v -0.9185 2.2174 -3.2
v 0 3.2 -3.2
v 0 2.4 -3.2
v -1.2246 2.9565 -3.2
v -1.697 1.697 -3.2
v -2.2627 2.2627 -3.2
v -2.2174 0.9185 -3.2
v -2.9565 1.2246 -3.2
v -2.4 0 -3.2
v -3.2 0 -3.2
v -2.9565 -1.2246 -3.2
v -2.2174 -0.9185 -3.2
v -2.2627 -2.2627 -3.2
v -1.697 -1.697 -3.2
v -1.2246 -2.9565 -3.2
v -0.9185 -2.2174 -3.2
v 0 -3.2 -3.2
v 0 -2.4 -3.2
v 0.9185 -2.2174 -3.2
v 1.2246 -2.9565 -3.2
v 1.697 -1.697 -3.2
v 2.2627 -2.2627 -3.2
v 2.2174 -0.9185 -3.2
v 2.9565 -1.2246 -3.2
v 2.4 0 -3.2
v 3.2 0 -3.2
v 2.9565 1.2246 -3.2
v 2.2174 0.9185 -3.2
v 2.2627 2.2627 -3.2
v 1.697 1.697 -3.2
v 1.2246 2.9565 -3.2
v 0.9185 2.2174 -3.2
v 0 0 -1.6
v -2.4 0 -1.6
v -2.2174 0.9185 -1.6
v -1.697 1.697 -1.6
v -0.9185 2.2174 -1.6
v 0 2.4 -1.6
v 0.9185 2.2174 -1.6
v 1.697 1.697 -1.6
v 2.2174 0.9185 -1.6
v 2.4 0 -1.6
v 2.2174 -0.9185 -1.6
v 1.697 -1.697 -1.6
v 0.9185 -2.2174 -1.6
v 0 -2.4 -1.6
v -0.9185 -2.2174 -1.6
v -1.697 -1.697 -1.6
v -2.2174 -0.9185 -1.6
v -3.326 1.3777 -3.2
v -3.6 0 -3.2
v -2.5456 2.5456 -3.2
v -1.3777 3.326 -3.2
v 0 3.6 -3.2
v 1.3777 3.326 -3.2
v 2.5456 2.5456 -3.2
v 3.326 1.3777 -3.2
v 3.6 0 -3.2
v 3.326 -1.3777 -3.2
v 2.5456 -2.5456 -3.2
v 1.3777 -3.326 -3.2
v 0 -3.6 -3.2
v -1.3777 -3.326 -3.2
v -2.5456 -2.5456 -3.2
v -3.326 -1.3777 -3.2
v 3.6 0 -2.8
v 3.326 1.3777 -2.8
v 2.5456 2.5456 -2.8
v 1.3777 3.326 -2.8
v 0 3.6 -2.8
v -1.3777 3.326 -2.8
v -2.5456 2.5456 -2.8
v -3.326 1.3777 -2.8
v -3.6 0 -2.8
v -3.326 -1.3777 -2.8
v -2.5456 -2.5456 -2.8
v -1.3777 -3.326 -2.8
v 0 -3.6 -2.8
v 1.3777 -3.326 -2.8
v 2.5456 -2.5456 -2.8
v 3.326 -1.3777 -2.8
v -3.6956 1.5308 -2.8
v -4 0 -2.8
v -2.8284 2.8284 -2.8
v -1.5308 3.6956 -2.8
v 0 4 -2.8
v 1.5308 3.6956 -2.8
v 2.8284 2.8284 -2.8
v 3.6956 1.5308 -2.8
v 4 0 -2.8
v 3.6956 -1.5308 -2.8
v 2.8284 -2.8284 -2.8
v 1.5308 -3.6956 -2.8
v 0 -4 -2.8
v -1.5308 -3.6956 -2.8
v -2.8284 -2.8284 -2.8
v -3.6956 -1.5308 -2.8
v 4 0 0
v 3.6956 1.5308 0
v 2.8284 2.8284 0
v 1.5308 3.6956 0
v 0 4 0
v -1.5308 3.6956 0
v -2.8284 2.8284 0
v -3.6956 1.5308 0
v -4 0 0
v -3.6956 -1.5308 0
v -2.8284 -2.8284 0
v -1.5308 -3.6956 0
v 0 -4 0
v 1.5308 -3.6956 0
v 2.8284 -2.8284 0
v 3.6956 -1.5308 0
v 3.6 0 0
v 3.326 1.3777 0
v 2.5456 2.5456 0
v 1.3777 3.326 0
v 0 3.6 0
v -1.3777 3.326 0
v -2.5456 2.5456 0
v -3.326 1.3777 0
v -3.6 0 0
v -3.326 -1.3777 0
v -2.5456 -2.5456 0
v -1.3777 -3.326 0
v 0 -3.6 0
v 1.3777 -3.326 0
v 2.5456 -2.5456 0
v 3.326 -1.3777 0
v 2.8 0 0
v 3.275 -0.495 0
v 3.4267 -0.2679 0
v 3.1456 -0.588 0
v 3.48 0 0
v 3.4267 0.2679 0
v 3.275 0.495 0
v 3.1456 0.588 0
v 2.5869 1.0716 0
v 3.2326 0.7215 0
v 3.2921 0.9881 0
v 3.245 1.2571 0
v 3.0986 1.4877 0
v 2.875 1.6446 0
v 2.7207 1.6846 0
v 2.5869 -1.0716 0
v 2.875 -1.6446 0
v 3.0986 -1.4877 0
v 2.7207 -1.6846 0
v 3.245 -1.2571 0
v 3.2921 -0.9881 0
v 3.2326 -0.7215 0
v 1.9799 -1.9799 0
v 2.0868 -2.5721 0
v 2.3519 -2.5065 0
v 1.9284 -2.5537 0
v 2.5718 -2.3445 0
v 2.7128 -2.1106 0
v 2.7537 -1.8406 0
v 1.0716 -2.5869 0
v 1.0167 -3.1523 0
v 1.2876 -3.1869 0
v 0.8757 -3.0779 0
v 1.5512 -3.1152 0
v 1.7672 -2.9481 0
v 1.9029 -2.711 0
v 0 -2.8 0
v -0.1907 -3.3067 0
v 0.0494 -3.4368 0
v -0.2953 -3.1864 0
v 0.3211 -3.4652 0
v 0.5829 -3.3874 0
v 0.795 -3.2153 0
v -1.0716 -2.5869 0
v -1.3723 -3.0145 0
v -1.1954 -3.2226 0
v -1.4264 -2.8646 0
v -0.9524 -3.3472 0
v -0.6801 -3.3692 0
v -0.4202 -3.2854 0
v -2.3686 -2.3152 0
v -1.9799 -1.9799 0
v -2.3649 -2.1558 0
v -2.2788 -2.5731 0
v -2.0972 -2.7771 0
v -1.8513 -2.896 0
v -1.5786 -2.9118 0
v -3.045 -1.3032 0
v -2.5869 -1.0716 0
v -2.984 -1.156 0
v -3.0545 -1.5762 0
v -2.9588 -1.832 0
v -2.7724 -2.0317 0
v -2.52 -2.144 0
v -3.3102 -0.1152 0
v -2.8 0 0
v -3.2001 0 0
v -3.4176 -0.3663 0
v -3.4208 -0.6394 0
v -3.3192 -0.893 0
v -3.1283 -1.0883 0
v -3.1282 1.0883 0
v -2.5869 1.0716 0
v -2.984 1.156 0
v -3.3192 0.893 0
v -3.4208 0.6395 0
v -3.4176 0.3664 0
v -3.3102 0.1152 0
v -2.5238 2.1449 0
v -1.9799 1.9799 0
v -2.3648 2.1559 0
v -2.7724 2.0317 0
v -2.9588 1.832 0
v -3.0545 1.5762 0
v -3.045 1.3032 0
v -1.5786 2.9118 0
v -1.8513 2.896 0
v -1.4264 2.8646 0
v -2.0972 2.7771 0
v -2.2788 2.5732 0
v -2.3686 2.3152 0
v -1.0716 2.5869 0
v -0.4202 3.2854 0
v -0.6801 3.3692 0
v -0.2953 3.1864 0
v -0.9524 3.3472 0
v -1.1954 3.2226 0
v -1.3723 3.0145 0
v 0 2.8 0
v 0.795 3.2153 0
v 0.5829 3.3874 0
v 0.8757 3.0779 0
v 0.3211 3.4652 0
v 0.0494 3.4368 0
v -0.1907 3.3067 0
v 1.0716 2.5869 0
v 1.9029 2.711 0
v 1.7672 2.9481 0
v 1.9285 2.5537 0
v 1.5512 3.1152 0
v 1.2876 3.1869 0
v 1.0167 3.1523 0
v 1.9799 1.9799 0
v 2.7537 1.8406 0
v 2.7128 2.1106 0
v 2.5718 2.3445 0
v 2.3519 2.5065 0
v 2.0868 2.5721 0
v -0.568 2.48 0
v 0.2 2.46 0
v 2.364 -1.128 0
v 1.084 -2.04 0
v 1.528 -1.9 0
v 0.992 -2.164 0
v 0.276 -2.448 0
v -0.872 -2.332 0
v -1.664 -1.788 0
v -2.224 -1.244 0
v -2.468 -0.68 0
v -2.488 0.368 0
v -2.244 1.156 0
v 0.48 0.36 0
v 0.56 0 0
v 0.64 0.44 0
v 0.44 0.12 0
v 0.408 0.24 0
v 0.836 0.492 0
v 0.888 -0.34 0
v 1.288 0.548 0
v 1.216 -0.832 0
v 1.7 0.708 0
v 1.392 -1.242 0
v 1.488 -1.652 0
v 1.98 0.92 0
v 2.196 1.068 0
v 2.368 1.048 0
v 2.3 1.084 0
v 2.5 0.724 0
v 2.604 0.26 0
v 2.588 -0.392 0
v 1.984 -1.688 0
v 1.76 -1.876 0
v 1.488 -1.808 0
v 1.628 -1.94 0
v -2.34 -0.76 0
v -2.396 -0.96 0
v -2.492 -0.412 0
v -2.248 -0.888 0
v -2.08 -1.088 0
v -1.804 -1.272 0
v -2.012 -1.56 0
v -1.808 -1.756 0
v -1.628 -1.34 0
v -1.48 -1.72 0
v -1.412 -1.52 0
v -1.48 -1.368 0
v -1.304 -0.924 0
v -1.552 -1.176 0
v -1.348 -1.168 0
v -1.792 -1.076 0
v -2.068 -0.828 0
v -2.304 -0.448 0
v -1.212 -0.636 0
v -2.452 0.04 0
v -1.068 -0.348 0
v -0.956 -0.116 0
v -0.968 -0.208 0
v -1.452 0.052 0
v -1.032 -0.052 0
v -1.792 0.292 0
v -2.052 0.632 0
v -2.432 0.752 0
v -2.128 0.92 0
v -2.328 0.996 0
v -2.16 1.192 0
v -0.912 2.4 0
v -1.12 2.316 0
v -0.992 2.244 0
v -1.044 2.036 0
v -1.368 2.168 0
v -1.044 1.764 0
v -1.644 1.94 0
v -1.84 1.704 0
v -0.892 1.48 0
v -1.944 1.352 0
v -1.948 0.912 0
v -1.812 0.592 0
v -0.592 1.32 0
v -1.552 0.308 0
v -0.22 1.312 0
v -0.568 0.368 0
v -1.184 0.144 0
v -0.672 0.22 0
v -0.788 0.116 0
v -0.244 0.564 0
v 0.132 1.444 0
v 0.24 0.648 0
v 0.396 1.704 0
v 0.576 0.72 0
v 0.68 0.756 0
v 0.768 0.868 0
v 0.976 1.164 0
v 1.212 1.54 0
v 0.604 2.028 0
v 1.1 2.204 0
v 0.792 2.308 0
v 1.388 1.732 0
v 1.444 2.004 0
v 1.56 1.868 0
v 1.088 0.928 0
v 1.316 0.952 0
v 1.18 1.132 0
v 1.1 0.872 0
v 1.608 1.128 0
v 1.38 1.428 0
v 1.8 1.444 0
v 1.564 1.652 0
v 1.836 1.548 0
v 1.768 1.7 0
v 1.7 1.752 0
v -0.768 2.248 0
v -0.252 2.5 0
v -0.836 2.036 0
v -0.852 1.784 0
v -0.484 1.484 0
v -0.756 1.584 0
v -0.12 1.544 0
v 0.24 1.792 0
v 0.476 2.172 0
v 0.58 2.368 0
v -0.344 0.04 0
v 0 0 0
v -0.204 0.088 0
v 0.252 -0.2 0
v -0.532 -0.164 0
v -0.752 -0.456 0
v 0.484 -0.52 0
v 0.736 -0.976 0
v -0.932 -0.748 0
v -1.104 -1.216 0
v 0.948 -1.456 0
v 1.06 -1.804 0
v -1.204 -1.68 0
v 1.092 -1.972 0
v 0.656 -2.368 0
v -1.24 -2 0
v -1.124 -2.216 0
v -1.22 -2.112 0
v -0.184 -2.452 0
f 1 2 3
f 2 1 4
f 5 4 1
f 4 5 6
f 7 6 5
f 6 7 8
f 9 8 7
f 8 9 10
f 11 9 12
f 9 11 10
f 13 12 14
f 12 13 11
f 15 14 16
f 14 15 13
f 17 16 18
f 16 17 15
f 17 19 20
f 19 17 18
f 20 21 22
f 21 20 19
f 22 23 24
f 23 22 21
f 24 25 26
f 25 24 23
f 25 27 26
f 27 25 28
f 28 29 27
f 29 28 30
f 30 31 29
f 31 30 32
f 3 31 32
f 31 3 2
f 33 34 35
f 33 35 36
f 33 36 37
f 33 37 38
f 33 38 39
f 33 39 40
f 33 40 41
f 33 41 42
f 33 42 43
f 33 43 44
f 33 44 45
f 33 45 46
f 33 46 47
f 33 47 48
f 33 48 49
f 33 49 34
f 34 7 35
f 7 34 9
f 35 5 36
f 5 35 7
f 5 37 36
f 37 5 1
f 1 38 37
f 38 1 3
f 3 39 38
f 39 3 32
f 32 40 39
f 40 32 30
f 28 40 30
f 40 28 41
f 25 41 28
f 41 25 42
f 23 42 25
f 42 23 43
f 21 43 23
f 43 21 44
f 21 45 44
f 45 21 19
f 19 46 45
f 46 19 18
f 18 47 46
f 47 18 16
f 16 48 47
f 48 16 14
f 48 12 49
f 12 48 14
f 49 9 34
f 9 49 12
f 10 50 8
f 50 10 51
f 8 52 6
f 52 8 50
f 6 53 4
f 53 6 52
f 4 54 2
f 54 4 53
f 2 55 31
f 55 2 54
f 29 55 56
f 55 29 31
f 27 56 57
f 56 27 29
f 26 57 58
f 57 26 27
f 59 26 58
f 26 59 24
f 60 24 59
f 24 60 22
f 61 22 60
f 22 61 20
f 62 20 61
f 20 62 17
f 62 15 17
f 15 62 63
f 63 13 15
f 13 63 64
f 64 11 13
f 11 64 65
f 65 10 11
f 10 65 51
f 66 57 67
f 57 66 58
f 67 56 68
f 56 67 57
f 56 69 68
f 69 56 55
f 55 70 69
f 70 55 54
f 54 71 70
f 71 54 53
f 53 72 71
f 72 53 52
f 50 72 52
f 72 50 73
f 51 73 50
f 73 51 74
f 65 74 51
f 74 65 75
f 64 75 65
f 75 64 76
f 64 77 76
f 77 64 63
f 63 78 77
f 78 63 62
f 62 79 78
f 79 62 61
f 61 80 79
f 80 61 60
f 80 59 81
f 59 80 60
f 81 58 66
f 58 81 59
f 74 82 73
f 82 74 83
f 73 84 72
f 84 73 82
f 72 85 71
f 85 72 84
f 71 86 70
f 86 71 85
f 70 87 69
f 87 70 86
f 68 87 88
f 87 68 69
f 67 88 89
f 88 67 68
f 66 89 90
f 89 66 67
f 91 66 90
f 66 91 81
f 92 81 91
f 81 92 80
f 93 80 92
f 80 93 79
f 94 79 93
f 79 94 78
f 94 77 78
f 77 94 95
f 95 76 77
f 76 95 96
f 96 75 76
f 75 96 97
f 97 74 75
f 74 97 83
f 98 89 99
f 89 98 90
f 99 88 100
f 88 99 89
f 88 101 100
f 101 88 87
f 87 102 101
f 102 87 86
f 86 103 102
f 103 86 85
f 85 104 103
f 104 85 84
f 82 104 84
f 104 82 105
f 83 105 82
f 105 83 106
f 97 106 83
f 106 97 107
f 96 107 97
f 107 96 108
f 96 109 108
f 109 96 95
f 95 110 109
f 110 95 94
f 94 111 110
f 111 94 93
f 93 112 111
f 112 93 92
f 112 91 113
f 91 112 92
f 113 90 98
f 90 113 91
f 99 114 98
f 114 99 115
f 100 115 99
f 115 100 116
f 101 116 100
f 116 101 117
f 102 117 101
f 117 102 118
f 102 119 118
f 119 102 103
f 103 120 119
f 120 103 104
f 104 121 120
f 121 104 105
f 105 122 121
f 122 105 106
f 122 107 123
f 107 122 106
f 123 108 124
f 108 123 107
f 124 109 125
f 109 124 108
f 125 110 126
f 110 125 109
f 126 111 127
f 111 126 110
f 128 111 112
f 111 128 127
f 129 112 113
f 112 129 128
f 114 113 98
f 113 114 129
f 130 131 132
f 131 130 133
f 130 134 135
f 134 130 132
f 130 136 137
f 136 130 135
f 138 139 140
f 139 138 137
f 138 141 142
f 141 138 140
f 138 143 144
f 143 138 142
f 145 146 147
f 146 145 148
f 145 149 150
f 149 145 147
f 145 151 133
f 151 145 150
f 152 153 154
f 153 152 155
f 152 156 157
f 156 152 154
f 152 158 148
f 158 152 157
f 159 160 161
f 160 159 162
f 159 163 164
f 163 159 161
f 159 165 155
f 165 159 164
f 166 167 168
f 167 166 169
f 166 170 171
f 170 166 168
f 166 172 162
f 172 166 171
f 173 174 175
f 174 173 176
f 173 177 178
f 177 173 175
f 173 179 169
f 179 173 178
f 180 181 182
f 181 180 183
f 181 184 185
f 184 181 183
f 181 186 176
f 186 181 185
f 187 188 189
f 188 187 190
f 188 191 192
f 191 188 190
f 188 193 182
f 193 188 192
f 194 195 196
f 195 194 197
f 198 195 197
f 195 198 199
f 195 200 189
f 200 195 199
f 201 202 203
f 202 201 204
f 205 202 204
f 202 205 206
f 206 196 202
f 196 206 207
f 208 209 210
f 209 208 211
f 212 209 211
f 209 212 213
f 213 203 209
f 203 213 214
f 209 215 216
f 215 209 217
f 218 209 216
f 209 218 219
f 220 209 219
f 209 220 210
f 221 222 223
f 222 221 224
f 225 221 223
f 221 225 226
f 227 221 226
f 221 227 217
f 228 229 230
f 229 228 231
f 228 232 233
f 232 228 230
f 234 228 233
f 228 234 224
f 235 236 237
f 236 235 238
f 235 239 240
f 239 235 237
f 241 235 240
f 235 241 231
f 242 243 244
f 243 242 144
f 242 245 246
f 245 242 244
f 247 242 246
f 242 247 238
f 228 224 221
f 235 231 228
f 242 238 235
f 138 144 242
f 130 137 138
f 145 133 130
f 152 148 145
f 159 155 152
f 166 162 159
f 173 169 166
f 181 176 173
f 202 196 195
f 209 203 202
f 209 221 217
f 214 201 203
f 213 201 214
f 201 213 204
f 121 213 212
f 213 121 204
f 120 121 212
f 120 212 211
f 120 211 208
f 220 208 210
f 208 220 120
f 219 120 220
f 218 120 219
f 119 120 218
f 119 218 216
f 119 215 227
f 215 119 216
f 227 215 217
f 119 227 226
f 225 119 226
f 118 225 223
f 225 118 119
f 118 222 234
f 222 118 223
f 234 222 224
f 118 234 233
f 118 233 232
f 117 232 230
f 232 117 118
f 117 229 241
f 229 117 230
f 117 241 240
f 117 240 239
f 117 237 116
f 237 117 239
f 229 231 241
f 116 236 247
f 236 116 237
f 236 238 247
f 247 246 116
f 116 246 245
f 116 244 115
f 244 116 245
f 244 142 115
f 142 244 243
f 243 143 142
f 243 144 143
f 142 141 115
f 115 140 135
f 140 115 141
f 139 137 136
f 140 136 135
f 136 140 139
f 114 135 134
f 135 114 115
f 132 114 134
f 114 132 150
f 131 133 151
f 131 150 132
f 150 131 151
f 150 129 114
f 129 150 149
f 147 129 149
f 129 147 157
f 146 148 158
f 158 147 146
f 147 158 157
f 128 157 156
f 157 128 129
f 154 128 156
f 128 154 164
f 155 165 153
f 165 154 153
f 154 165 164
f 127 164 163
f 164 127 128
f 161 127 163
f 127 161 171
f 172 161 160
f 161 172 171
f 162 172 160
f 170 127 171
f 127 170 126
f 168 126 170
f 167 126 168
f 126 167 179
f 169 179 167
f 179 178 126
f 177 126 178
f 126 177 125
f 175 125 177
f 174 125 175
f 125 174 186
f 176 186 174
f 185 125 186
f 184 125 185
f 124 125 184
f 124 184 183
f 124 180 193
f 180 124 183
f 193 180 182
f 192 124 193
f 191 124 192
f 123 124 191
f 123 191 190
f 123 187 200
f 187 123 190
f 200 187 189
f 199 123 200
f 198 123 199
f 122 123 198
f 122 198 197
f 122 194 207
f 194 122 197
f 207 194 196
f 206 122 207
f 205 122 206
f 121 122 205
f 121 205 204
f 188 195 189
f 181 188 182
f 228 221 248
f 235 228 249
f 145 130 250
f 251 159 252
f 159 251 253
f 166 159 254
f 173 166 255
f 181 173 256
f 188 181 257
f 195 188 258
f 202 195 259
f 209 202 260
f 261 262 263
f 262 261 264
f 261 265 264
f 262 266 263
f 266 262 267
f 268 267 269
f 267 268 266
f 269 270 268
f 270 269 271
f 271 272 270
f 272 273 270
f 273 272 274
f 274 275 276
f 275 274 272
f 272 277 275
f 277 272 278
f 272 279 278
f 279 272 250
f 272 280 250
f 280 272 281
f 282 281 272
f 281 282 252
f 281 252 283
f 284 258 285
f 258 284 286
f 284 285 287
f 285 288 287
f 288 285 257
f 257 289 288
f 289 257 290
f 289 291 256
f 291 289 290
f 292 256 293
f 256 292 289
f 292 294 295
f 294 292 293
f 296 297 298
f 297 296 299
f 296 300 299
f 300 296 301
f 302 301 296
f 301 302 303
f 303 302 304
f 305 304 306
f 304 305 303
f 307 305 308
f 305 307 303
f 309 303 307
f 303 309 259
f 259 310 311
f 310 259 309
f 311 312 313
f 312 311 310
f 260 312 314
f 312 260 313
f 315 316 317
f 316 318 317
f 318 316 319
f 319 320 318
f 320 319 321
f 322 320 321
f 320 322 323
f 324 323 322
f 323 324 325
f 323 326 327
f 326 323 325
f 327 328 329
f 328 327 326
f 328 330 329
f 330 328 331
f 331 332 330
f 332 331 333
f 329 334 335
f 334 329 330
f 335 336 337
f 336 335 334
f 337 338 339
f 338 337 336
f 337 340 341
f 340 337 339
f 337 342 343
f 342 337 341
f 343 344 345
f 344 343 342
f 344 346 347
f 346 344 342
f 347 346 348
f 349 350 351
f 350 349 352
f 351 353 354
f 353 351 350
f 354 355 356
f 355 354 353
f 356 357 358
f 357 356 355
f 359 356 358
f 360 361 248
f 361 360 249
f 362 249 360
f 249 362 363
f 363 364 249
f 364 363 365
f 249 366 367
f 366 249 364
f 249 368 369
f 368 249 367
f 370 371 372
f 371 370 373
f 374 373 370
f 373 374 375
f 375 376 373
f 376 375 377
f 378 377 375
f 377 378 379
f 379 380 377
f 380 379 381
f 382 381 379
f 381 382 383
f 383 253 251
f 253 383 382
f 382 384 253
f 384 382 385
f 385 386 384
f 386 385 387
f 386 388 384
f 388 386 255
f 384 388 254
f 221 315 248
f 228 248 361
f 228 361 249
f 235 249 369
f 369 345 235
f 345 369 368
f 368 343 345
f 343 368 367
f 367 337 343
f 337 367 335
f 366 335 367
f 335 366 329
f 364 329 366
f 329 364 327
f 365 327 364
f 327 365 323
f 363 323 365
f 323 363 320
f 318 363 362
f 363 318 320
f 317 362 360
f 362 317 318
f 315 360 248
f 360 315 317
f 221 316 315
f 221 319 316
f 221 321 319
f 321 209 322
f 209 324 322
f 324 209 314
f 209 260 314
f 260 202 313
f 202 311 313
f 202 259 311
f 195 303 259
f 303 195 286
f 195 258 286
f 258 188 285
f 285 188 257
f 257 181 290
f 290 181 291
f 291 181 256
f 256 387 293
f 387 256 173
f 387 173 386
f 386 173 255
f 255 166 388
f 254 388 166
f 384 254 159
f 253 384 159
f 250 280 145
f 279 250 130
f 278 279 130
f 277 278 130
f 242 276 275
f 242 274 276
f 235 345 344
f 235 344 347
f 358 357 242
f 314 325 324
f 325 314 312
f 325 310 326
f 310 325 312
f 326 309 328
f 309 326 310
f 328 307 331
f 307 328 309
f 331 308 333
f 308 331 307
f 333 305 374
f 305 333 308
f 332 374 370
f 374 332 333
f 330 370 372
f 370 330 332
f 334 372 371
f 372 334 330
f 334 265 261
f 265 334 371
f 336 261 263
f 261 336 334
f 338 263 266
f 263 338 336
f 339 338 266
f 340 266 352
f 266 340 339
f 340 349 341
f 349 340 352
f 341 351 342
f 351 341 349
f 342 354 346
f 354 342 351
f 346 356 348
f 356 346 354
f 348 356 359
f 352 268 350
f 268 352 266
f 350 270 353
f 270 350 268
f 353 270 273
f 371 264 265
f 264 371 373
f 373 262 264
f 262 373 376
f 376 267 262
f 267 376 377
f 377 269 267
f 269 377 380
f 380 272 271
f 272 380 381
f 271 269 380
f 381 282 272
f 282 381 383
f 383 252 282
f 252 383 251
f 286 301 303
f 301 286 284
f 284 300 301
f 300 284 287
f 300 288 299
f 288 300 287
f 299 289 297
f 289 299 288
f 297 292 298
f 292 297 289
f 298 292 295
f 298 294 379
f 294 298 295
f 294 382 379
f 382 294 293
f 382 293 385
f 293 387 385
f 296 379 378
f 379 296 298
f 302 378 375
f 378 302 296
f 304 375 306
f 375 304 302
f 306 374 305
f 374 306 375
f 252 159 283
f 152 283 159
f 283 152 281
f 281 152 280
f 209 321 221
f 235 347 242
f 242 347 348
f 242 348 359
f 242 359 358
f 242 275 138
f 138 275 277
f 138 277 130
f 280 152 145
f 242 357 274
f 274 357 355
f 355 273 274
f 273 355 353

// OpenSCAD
use <../lib.scad>
use <../p/4-4ering.scad>
use <s/98138pn2s01.scad>
use <s/98138s01.scad>
function ldraw_lib__98138pn2() = [
// 0 Tile  1 x  1 Round with Sushi Salmon Maki Roll Pattern
// 0 Name: 98138pn2.dat
// 0 Author: Gerald Lasser [GeraldLasser]
// 0 !LDRAW_ORG Part UPDATE 2018-01
// 0 !LICENSE Licensed under CC BY 2.0 and CC BY 4.0 : see CAreadme.txt
// 
// 0 BFC CERTIFY CCW
  [0,"BFC","CERTIFY"],
  [0,"BFC","CCW"],
// 
// 0 !KEYWORDS BrickLink 98138pb038
// 
// 0 !HISTORY 2018-01-30 [PTadmin] Official Update 2018-01
// 
// 
// 1 16 0 0 0 1 0 0 0 1 0 0 0 1 s\98138s01.dat
  [1,16,0,0,0,1,0,0,0,1,0,0,0,1, ldraw_lib__s__98138s01()],
// 1 16 0 0 0 1 0 0 0 1 0 0 0 1 s\98138pn2s01.dat
  [1,16,0,0,0,1,0,0,0,1,0,0,0,1, ldraw_lib__s__98138pn2s01()],
// 1 16 0 0 0 9 0 0 0 1 0 0 0 9 4-4ering.dat
  [1,16,0,0,0,9,0,0,0,1,0,0,0,9, ldraw_lib__4_4ering()],
// 3 15 0 0 7 -2.6789 0 6.4673 -1.42 0 6.2
  [3,15,0,0,7,-2.6789,0,6.4673,-1.42,0,6.2],
// 3 15 2.6789 0 6.4673 0 0 7 .5 0 6.15
  [3,15,2.6789,0,6.4673,0,0,7,.5,0,6.15],
// 3 15 6.4673 0 -2.6789 7 0 0 5.91 0 -2.82
  [3,15,6.4673,0,-2.6789,7,0,0,5.91,0,-2.82],
// 4 15 2.6789 0 -6.4673 3.82 0 -4.75 2.71 0 -5.1 2.48 0 -5.41
  [4,15,2.6789,0,-6.4673,3.82,0,-4.75,2.71,0,-5.1,2.48,0,-5.41],
// 3 15 0 0 -7 2.6789 0 -6.4673 .69 0 -6.12
  [3,15,0,0,-7,2.6789,0,-6.4673,.69,0,-6.12],
// 3 15 -2.6789 0 -6.4673 0 0 -7 -2.18 0 -5.83
  [3,15,-2.6789,0,-6.4673,0,0,-7,-2.18,0,-5.83],
// 3 15 -4.9497 0 -4.9497 -2.6789 0 -6.4673 -4.16 0 -4.47
  [3,15,-4.9497,0,-4.9497,-2.6789,0,-6.4673,-4.16,0,-4.47],
// 3 15 -6.4673 0 -2.6789 -4.9497 0 -4.9497 -5.56 0 -3.11
  [3,15,-6.4673,0,-2.6789,-4.9497,0,-4.9497,-5.56,0,-3.11],
// 3 15 -7 0 0 -6.4673 0 -2.6789 -6.17 0 -1.7
  [3,15,-7,0,0,-6.4673,0,-2.6789,-6.17,0,-1.7],
// 3 15 -6.4673 0 2.6789 -7 0 0 -6.22 0 .92
  [3,15,-6.4673,0,2.6789,-7,0,0,-6.22,0,.92],
// 3 15 -4.9497 0 4.9497 -6.4673 0 2.6789 -5.61 0 2.89
  [3,15,-4.9497,0,4.9497,-6.4673,0,2.6789,-5.61,0,2.89],
// 4 27 1.4 0 0 1.6 0 1.1 1.2 0 .9 1.1 0 .3
  [4,27,1.4,0,0,1.6,0,1.1,1.2,0,.9,1.1,0,.3],
// 3 27 1.2 0 .9 1.02 0 .6 1.1 0 .3
  [3,27,1.2,0,.9,1.02,0,.6,1.1,0,.3],
// 4 27 1.6 0 1.1 1.4 0 0 2.22 0 -.85 2.09 0 1.23
  [4,27,1.6,0,1.1,1.4,0,0,2.22,0,-.85,2.09,0,1.23],
// 4 27 3.22 0 1.37 2.09 0 1.23 2.22 0 -.85 3.04 0 -2.08
  [4,27,3.22,0,1.37,2.09,0,1.23,2.22,0,-.85,3.04,0,-2.08],
// 4 27 3.04 0 -2.08 3.48 0 -3.105 4.25 0 1.77 3.22 0 1.37
  [4,27,3.04,0,-2.08,3.48,0,-3.105,4.25,0,1.77,3.22,0,1.37],
// 3 27 3.48 0 -3.105 3.72 0 -4.13 4.25 0 1.77
  [3,27,3.48,0,-3.105,3.72,0,-4.13,4.25,0,1.77],
// 4 27 4.95 0 2.3 4.25 0 1.77 3.72 0 -4.13 5.49 0 2.67
  [4,27,4.95,0,2.3,4.25,0,1.77,3.72,0,-4.13,5.49,0,2.67],
// 4 27 5.75 0 2.71 5.49 0 2.67 3.72 0 -4.13 5.92 0 2.62
  [4,27,5.75,0,2.71,5.49,0,2.67,3.72,0,-4.13,5.92,0,2.62],
// 4 27 6.25 0 1.81 5.92 0 2.62 3.72 0 -4.13 6.51 0 .65
  [4,27,6.25,0,1.81,5.92,0,2.62,3.72,0,-4.13,6.51,0,.65],
// 4 27 6.47 0 -.98 6.51 0 .65 3.72 0 -4.13 5.91 0 -2.82
  [4,27,6.47,0,-.98,6.51,0,.65,3.72,0,-4.13,5.91,0,-2.82],
// 4 27 4.96 0 -4.22 5.91 0 -2.82 3.72 0 -4.13 4.4 0 -4.69
  [4,27,4.96,0,-4.22,5.91,0,-2.82,3.72,0,-4.13,4.4,0,-4.69],
// 4 27 4.4 0 -4.69 3.72 0 -4.13 3.72 0 -4.52 3.82 0 -4.75
  [4,27,4.4,0,-4.69,3.72,0,-4.13,3.72,0,-4.52,3.82,0,-4.75],
// 3 27 4.4 0 -4.69 3.82 0 -4.75 4.07 0 -4.85
  [3,27,4.4,0,-4.69,3.82,0,-4.75,4.07,0,-4.85],
// 4 25 -5.85 0 -1.9 -6.23 0 -1.03 -6.17 0 -1.7 -5.99 0 -2.4
  [4,25,-5.85,0,-1.9,-6.23,0,-1.03,-6.17,0,-1.7,-5.99,0,-2.4],
// 3 25 -5.85 0 -1.9 -5.99 0 -2.4 -5.62 0 -2.22
  [3,25,-5.85,0,-1.9,-5.99,0,-2.4,-5.62,0,-2.22],
// 4 25 -5.2 0 -2.72 -5.62 0 -2.22 -5.99 0 -2.4 -5.56 0 -3.11
  [4,25,-5.2,0,-2.72,-5.62,0,-2.22,-5.99,0,-2.4,-5.56,0,-3.11],
// 4 25 -4.51 0 -3.18 -5.2 0 -2.72 -5.56 0 -3.11 -5.03 0 -3.9
  [4,25,-4.51,0,-3.18,-5.2,0,-2.72,-5.56,0,-3.11,-5.03,0,-3.9],
// 4 25 -4.51 0 -3.18 -5.03 0 -3.9 -4.52 0 -4.39 -4.16 0 -4.47
  [4,25,-4.51,0,-3.18,-5.03,0,-3.9,-4.52,0,-4.39,-4.16,0,-4.47],
// 4 25 -4.07 0 -3.35 -4.51 0 -3.18 -4.16 0 -4.47 -3.7 0 -4.3
  [4,25,-4.07,0,-3.35,-4.51,0,-3.18,-4.16,0,-4.47,-3.7,0,-4.3],
// 4 25 -3.7 0 -3.42 -4.07 0 -3.35 -3.7 0 -4.3 -3.53 0 -3.8
  [4,25,-3.7,0,-3.42,-4.07,0,-3.35,-3.7,0,-4.3,-3.53,0,-3.8],
// 4 25 -3.88 0 -2.94 -3.37 0 -2.92 -3.26 0 -2.31 -4.48 0 -2.69
  [4,25,-3.88,0,-2.94,-3.37,0,-2.92,-3.26,0,-2.31,-4.48,0,-2.69],
// 4 25 -5.17 0 -2.07 -4.48 0 -2.69 -3.26 0 -2.31 -5.76 0 -1.12
  [4,25,-5.17,0,-2.07,-4.48,0,-2.69,-3.26,0,-2.31,-5.76,0,-1.12],
// 4 25 -5.76 0 -1.12 -3.26 0 -2.31 -3.03 0 -1.59 -6.13 0 .1
  [4,25,-5.76,0,-1.12,-3.26,0,-2.31,-3.03,0,-1.59,-6.13,0,.1],
// 3 25 -6.13 0 .1 -3.03 0 -1.59 -2.67 0 -.87
  [3,25,-6.13,0,.1,-3.03,0,-1.59,-2.67,0,-.87],
// 4 25 -6.13 0 .1 -2.67 0 -.87 -2.42 0 -.52 -2.39 0 -.29
  [4,25,-6.13,0,.1,-2.67,0,-.87,-2.42,0,-.52,-2.39,0,-.29],
// 4 25 -6.13 0 .1 -2.39 0 -.29 -2.58 0 -.13 -3.63 0 .13
  [4,25,-6.13,0,.1,-2.39,0,-.29,-2.58,0,-.13,-3.63,0,.13],
// 4 25 -6.22 0 .92 -6.13 0 .1 -3.63 0 .13 -4.48 0 .73
  [4,25,-6.22,0,.92,-6.13,0,.1,-3.63,0,.13,-4.48,0,.73],
// 4 25 -6.22 0 .92 -4.48 0 .73 -5.13 0 1.58 -6.08 0 1.88
  [4,25,-6.22,0,.92,-4.48,0,.73,-5.13,0,1.58,-6.08,0,1.88],
// 4 25 -6.08 0 1.88 -5.13 0 1.58 -5.32 0 2.3 -5.82 0 2.49
  [4,25,-6.08,0,1.88,-5.13,0,1.58,-5.32,0,2.3,-5.82,0,2.49],
// 4 25 -5.61 0 2.89 -5.82 0 2.49 -5.32 0 2.3 -5.4 0 2.98
  [4,25,-5.61,0,2.89,-5.82,0,2.49,-5.32,0,2.3,-5.4,0,2.98],
// 3 25 -2.28 0 6 -2.8 0 5.79 -2.48 0 5.61
  [3,25,-2.28,0,6,-2.8,0,5.79,-2.48,0,5.61],
// 4 25 -2.61 0 5.09 -2.48 0 5.61 -2.8 0 5.79 -3.42 0 5.42
  [4,25,-2.61,0,5.09,-2.48,0,5.61,-2.8,0,5.79,-3.42,0,5.42],
// 4 25 -2.61 0 5.09 -3.42 0 5.42 -4.11 0 4.85 -2.61 0 4.41
  [4,25,-2.61,0,5.09,-3.42,0,5.42,-4.11,0,4.85,-2.61,0,4.41],
// 4 25 -2.61 0 4.41 -4.11 0 4.85 -4.6 0 4.26 -2.23 0 3.7
  [4,25,-2.61,0,4.41,-4.11,0,4.85,-4.6,0,4.26,-2.23,0,3.7],
// 4 25 -2.23 0 3.7 -4.6 0 4.26 -4.86 0 3.38 -4.87 0 2.28
  [4,25,-2.23,0,3.7,-4.6,0,4.26,-4.86,0,3.38,-4.87,0,2.28],
// 4 25 -1.48 0 3.3 -2.23 0 3.7 -4.87 0 2.28 -4.53 0 1.48
  [4,25,-1.48,0,3.3,-2.23,0,3.7,-4.87,0,2.28,-4.53,0,1.48],
// 4 25 -.55 0 3.28 -1.48 0 3.3 -4.53 0 1.48 -3.88 0 .77
  [4,25,-.55,0,3.28,-1.48,0,3.3,-4.53,0,1.48,-3.88,0,.77],
// 4 25 -.55 0 3.28 -3.88 0 .77 -2.96 0 .36 -1.42 0 .92
  [4,25,-.55,0,3.28,-3.88,0,.77,-2.96,0,.36,-1.42,0,.92],
// 4 25 -1.68 0 .55 -1.42 0 .92 -2.96 0 .36 -1.97 0 .29
  [4,25,-1.68,0,.55,-1.42,0,.92,-2.96,0,.36,-1.97,0,.29],
// 4 25 -.55 0 3.28 -1.42 0 .92 -.61 0 1.41 .33 0 3.61
  [4,25,-.55,0,3.28,-1.42,0,.92,-.61,0,1.41,.33,0,3.61],
// 4 25 .33 0 3.61 -.61 0 1.41 .6 0 1.62 .99 0 4.26
  [4,25,.33,0,3.61,-.61,0,1.41,.6,0,1.62,.99,0,4.26],
// 4 25 .99 0 4.26 .6 0 1.62 1.44 0 1.8 1.7 0 1.89
  [4,25,.99,0,4.26,.6,0,1.62,1.44,0,1.8,1.7,0,1.89],
// 4 25 .99 0 4.26 1.7 0 1.89 1.92 0 2.17 2.44 0 2.91
  [4,25,.99,0,4.26,1.7,0,1.89,1.92,0,2.17,2.44,0,2.91],
// 4 25 1.51 0 5.07 .99 0 4.26 2.44 0 2.91 3.03 0 3.85
  [4,25,1.51,0,5.07,.99,0,4.26,2.44,0,2.91,3.03,0,3.85],
// 4 25 1.98 0 5.77 1.51 0 5.07 3.03 0 3.85 2.75 0 5.51
  [4,25,1.98,0,5.77,1.51,0,5.07,3.03,0,3.85,2.75,0,5.51],
// 4 25 2.75 0 5.51 3.03 0 3.85 3.47 0 4.33 3.61 0 5.01
  [4,25,2.75,0,5.51,3.03,0,3.85,3.47,0,4.33,3.61,0,5.01],
// 3 25 3.61 0 5.01 3.47 0 4.33 3.9 0 4.67
  [3,25,3.61,0,5.01,3.47,0,4.33,3.9,0,4.67],
// 4 25 2.95 0 2.83 2.72 0 2.32 2.75 0 2.18 3.29 0 2.38
  [4,25,2.95,0,2.83,2.72,0,2.32,2.75,0,2.18,3.29,0,2.38],
// 4 25 2.95 0 2.83 3.29 0 2.38 4.02 0 2.82 3.45 0 3.57
  [4,25,2.95,0,2.83,3.29,0,2.38,4.02,0,2.82,3.45,0,3.57],
// 4 25 3.91 0 4.13 3.45 0 3.57 4.02 0 2.82 4.5 0 3.61
  [4,25,3.91,0,4.13,3.45,0,3.57,4.02,0,2.82,4.5,0,3.61],
// 4 25 3.91 0 4.13 4.5 0 3.61 4.59 0 3.87 4.42 0 4.25
  [4,25,3.91,0,4.13,4.5,0,3.61,4.59,0,3.87,4.42,0,4.25],
// 3 25 4.25 0 4.38 3.91 0 4.13 4.42 0 4.25
  [3,25,4.25,0,4.38,3.91,0,4.13,4.42,0,4.25],
// 4 25 -.63 0 6.25 -1.42 0 6.2 -1.92 0 5.62 .5 0 6.15
  [4,25,-.63,0,6.25,-1.42,0,6.2,-1.92,0,5.62,.5,0,6.15],
// 4 25 .5 0 6.15 -1.92 0 5.62 -2.09 0 5.09 -2.13 0 4.46
  [4,25,.5,0,6.15,-1.92,0,5.62,-2.09,0,5.09,-2.13,0,4.46],
// 4 25 .5 0 6.15 -2.13 0 4.46 -1.89 0 3.96 -1.21 0 3.71
  [4,25,.5,0,6.15,-2.13,0,4.46,-1.89,0,3.96,-1.21,0,3.71],
// 4 25 .5 0 6.15 -1.21 0 3.71 -.3 0 3.86 .6 0 4.48
  [4,25,.5,0,6.15,-1.21,0,3.71,-.3,0,3.86,.6,0,4.48],
// 4 25 .5 0 6.15 .6 0 4.48 1.19 0 5.43 1.45 0 5.92
  [4,25,.5,0,6.15,.6,0,4.48,1.19,0,5.43,1.45,0,5.92],
// 4 226 0 0 0 -.51 0 .22 -.86 0 .1 .63 0 -.5
  [4,226,0,0,0,-.51,0,.22,-.86,0,.1,.63,0,-.5],
// 4 226 .63 0 -.5 -.86 0 .1 -1.33 0 -.41 -1.88 0 -1.14
  [4,226,.63,0,-.5,-.86,0,.1,-1.33,0,-.41,-1.88,0,-1.14],
// 4 226 1.21 0 -1.3 .63 0 -.5 -1.88 0 -1.14 1.84 0 -2.44
  [4,226,1.21,0,-1.3,.63,0,-.5,-1.88,0,-1.14,1.84,0,-2.44],
// 4 226 1.84 0 -2.44 -1.88 0 -1.14 -2.33 0 -1.87 -2.76 0 -3.04
  [4,226,1.84,0,-2.44,-1.88,0,-1.14,-2.33,0,-1.87,-2.76,0,-3.04],
// 4 226 2.37 0 -3.64 1.84 0 -2.44 -2.76 0 -3.04 2.65 0 -4.51
  [4,226,2.37,0,-3.64,1.84,0,-2.44,-2.76,0,-3.04,2.65,0,-4.51],
// 4 226 2.65 0 -4.51 -2.76 0 -3.04 -3.01 0 -4.2 2.73 0 -4.93
  [4,226,2.65,0,-4.51,-2.76,0,-3.04,-3.01,0,-4.2,2.73,0,-4.93],
// 4 226 2.71 0 -5.1 2.73 0 -4.93 -3.01 0 -4.2 2.48 0 -5.41
  [4,226,2.71,0,-5.1,2.73,0,-4.93,-3.01,0,-4.2,2.48,0,-5.41],
// 4 226 1.64 0 -5.92 2.48 0 -5.41 -3.01 0 -4.2 -3.1 0 -5
  [4,226,1.64,0,-5.92,2.48,0,-5.41,-3.01,0,-4.2,-3.1,0,-5],
// 4 226 1.64 0 -5.92 -3.1 0 -5 -3.05 0 -5.28 -2.81 0 -5.54
  [4,226,1.64,0,-5.92,-3.1,0,-5,-3.05,0,-5.28,-2.81,0,-5.54],
// 4 226 1.64 0 -5.92 -2.81 0 -5.54 -2.18 0 -5.83 -.46 0 -6.13
  [4,226,1.64,0,-5.92,-2.81,0,-5.54,-2.18,0,-5.83,-.46,0,-6.13],
// 3 226 1.64 0 -5.92 -.46 0 -6.13 .69 0 -6.12
  [3,226,1.64,0,-5.92,-.46,0,-6.13,.69,0,-6.12],
// 3 15 -2.6789 0 6.4673 -2.28 0 6 -1.42 0 6.2
  [3,15,-2.6789,0,6.4673,-2.28,0,6,-1.42,0,6.2],
// 3 15 0 0 7 -1.42 0 6.2 -.63 0 6.25
  [3,15,0,0,7,-1.42,0,6.2,-.63,0,6.25],
// 3 15 0 0 7 -.63 0 6.25 .5 0 6.15
  [3,15,0,0,7,-.63,0,6.25,.5,0,6.15],
// 3 15 2.6789 0 6.4673 .5 0 6.15 1.45 0 5.92
  [3,15,2.6789,0,6.4673,.5,0,6.15,1.45,0,5.92],
// 4 15 1.98 0 5.77 2.6789 0 6.4673 1.45 0 5.92 1.19 0 5.43
  [4,15,1.98,0,5.77,2.6789,0,6.4673,1.45,0,5.92,1.19,0,5.43],
// 4 15 1.51 0 5.07 1.98 0 5.77 1.19 0 5.43 .6 0 4.48
  [4,15,1.51,0,5.07,1.98,0,5.77,1.19,0,5.43,.6,0,4.48],
// 4 15 .99 0 4.26 1.51 0 5.07 .6 0 4.48 .33 0 3.61
  [4,15,.99,0,4.26,1.51,0,5.07,.6,0,4.48,.33,0,3.61],
// 4 15 .33 0 3.61 .6 0 4.48 -.3 0 3.86 -.55 0 3.28
  [4,15,.33,0,3.61,.6,0,4.48,-.3,0,3.86,-.55,0,3.28],
// 4 15 -.55 0 3.28 -.3 0 3.86 -1.21 0 3.71 -1.48 0 3.3
  [4,15,-.55,0,3.28,-.3,0,3.86,-1.21,0,3.71,-1.48,0,3.3],
// 4 15 -1.48 0 3.3 -1.21 0 3.71 -1.89 0 3.96 -2.23 0 3.7
  [4,15,-1.48,0,3.3,-1.21,0,3.71,-1.89,0,3.96,-2.23,0,3.7],
// 4 15 -2.61 0 4.41 -2.23 0 3.7 -1.89 0 3.96 -2.13 0 4.46
  [4,15,-2.61,0,4.41,-2.23,0,3.7,-1.89,0,3.96,-2.13,0,4.46],
// 4 15 -2.61 0 5.09 -2.61 0 4.41 -2.13 0 4.46 -2.09 0 5.09
  [4,15,-2.61,0,5.09,-2.61,0,4.41,-2.13,0,4.46,-2.09,0,5.09],
// 4 15 -2.48 0 5.61 -2.61 0 5.09 -2.09 0 5.09 -1.92 0 5.62
  [4,15,-2.48,0,5.61,-2.61,0,5.09,-2.09,0,5.09,-1.92,0,5.62],
// 4 15 -2.28 0 6 -2.48 0 5.61 -1.92 0 5.62 -1.42 0 6.2
  [4,15,-2.28,0,6,-2.48,0,5.61,-1.92,0,5.62,-1.42,0,6.2],
// 3 15 -2.6789 0 6.4673 -2.8 0 5.79 -2.28 0 6
  [3,15,-2.6789,0,6.4673,-2.8,0,5.79,-2.28,0,6],
// 3 15 -2.6789 0 6.4673 -3.42 0 5.42 -2.8 0 5.79
  [3,15,-2.6789,0,6.4673,-3.42,0,5.42,-2.8,0,5.79],
// 3 15 -2.6789 0 6.4673 -4.11 0 4.85 -3.42 0 5.42
  [3,15,-2.6789,0,6.4673,-4.11,0,4.85,-3.42,0,5.42],
// 3 15 -4.11 0 4.85 -4.9497 0 4.9497 -4.6 0 4.26
  [3,15,-4.11,0,4.85,-4.9497,0,4.9497,-4.6,0,4.26],
// 4 15 -4.86 0 3.38 -4.6 0 4.26 -4.9497 0 4.9497 -5.4 0 2.98
  [4,15,-4.86,0,3.38,-4.6,0,4.26,-4.9497,0,4.9497,-5.4,0,2.98],
// 3 15 -4.9497 0 4.9497 -5.61 0 2.89 -5.4 0 2.98
  [3,15,-4.9497,0,4.9497,-5.61,0,2.89,-5.4,0,2.98],
// 3 15 -5.61 0 2.89 -6.4673 0 2.6789 -5.82 0 2.49
  [3,15,-5.61,0,2.89,-6.4673,0,2.6789,-5.82,0,2.49],
// 3 15 -6.4673 0 2.6789 -6.08 0 1.88 -5.82 0 2.49
  [3,15,-6.4673,0,2.6789,-6.08,0,1.88,-5.82,0,2.49],
// 3 15 -6.4673 0 2.6789 -6.22 0 .92 -6.08 0 1.88
  [3,15,-6.4673,0,2.6789,-6.22,0,.92,-6.08,0,1.88],
// 4 15 -6.13 0 .1 -6.22 0 .92 -7 0 0 -6.23 0 -1.03
  [4,15,-6.13,0,.1,-6.22,0,.92,-7,0,0,-6.23,0,-1.03],
// 3 15 -7 0 0 -6.17 0 -1.7 -6.23 0 -1.03
  [3,15,-7,0,0,-6.17,0,-1.7,-6.23,0,-1.03],
// 3 15 -6.17 0 -1.7 -6.4673 0 -2.6789 -5.99 0 -2.4
  [3,15,-6.17,0,-1.7,-6.4673,0,-2.6789,-5.99,0,-2.4],
// 3 15 -5.99 0 -2.4 -6.4673 0 -2.6789 -5.56 0 -3.11
  [3,15,-5.99,0,-2.4,-6.4673,0,-2.6789,-5.56,0,-3.11],
// 3 15 -5.56 0 -3.11 -4.9497 0 -4.9497 -5.03 0 -3.9
  [3,15,-5.56,0,-3.11,-4.9497,0,-4.9497,-5.03,0,-3.9],
// 3 15 -5.03 0 -3.9 -4.9497 0 -4.9497 -4.52 0 -4.39
  [3,15,-5.03,0,-3.9,-4.9497,0,-4.9497,-4.52,0,-4.39],
// 3 15 -4.52 0 -4.39 -4.9497 0 -4.9497 -4.16 0 -4.47
  [3,15,-4.52,0,-4.39,-4.9497,0,-4.9497,-4.16,0,-4.47],
// 4 15 -3.7 0 -4.3 -4.16 0 -4.47 -2.6789 0 -6.4673 -3.05 0 -5.28
  [4,15,-3.7,0,-4.3,-4.16,0,-4.47,-2.6789,0,-6.4673,-3.05,0,-5.28],
// 3 15 -3.05 0 -5.28 -2.6789 0 -6.4673 -2.81 0 -5.54
  [3,15,-3.05,0,-5.28,-2.6789,0,-6.4673,-2.81,0,-5.54],
// 3 15 -2.81 0 -5.54 -2.6789 0 -6.4673 -2.18 0 -5.83
  [3,15,-2.81,0,-5.54,-2.6789,0,-6.4673,-2.18,0,-5.83],
// 3 15 -2.18 0 -5.83 0 0 -7 -.46 0 -6.13
  [3,15,-2.18,0,-5.83,0,0,-7,-.46,0,-6.13],
// 3 15 .69 0 -6.12 -.46 0 -6.13 0 0 -7
  [3,15,.69,0,-6.12,-.46,0,-6.13,0,0,-7],
// 3 15 1.64 0 -5.92 .69 0 -6.12 2.6789 0 -6.4673
  [3,15,1.64,0,-5.92,.69,0,-6.12,2.6789,0,-6.4673],
// 3 15 2.48 0 -5.41 1.64 0 -5.92 2.6789 0 -6.4673
  [3,15,2.48,0,-5.41,1.64,0,-5.92,2.6789,0,-6.4673],
// 3 15 5.91 0 -2.82 4.96 0 -4.22 6.4673 0 -2.6789
  [3,15,5.91,0,-2.82,4.96,0,-4.22,6.4673,0,-2.6789],
// 3 15 6.47 0 -.98 5.91 0 -2.82 7 0 0
  [3,15,6.47,0,-.98,5.91,0,-2.82,7,0,0],
// 3 15 6.51 0 .65 6.47 0 -.98 7 0 0
  [3,15,6.51,0,.65,6.47,0,-.98,7,0,0],
// 3 15 6.25 0 1.81 6.51 0 .65 7 0 0
  [3,15,6.25,0,1.81,6.51,0,.65,7,0,0],
// 3 15 4.9497 0 4.9497 5.75 0 2.71 5.92 0 2.62
  [3,15,4.9497,0,4.9497,5.75,0,2.71,5.92,0,2.62],
// 3 15 4.9497 0 4.9497 5.49 0 2.67 5.75 0 2.71
  [3,15,4.9497,0,4.9497,5.49,0,2.67,5.75,0,2.71],
// 3 15 2.6789 0 6.4673 1.98 0 5.77 2.75 0 5.51
  [3,15,2.6789,0,6.4673,1.98,0,5.77,2.75,0,5.51],
// 3 15 2.6789 0 6.4673 2.75 0 5.51 3.61 0 5.01
  [3,15,2.6789,0,6.4673,2.75,0,5.51,3.61,0,5.01],
// 3 15 4.42 0 4.25 4.59 0 3.87 4.9497 0 4.9497
  [3,15,4.42,0,4.25,4.59,0,3.87,4.9497,0,4.9497],
// 4 15 -4.87 0 2.28 -4.86 0 3.38 -5.4 0 2.98 -5.32 0 2.3
  [4,15,-4.87,0,2.28,-4.86,0,3.38,-5.4,0,2.98,-5.32,0,2.3],
// 4 15 -4.87 0 2.28 -5.32 0 2.3 -5.13 0 1.58 -4.53 0 1.48
  [4,15,-4.87,0,2.28,-5.32,0,2.3,-5.13,0,1.58,-4.53,0,1.48],
// 4 15 -4.53 0 1.48 -5.13 0 1.58 -4.48 0 .73 -3.88 0 .77
  [4,15,-4.53,0,1.48,-5.13,0,1.58,-4.48,0,.73,-3.88,0,.77],
// 4 15 -3.88 0 .77 -4.48 0 .73 -3.63 0 .13 -2.96 0 .36
  [4,15,-3.88,0,.77,-4.48,0,.73,-3.63,0,.13,-2.96,0,.36],
// 4 15 -2.96 0 .36 -3.63 0 .13 -2.58 0 -.13 -1.97 0 .29
  [4,15,-2.96,0,.36,-3.63,0,.13,-2.58,0,-.13,-1.97,0,.29],
// 4 15 -1.97 0 .29 -2.58 0 -.13 -2.39 0 -.29 -1.33 0 -.41
  [4,15,-1.97,0,.29,-2.58,0,-.13,-2.39,0,-.29,-1.33,0,-.41],
// 4 15 -1.97 0 .29 -1.33 0 -.41 -.86 0 .1 -1.68 0 .55
  [4,15,-1.97,0,.29,-1.33,0,-.41,-.86,0,.1,-1.68,0,.55],
// 4 15 -1.42 0 .92 -1.68 0 .55 -.86 0 .1 -.51 0 .22
  [4,15,-1.42,0,.92,-1.68,0,.55,-.86,0,.1,-.51,0,.22],
// 4 15 -.61 0 1.41 -1.42 0 .92 -.51 0 .22 0 0 0
  [4,15,-.61,0,1.41,-1.42,0,.92,-.51,0,.22,0,0,0],
// 4 15 -.61 0 1.41 0 0 0 1.02 0 .6 1.2 0 .9
  [4,15,-.61,0,1.41,0,0,0,1.02,0,.6,1.2,0,.9],
// 4 15 .6 0 1.62 -.61 0 1.41 1.2 0 .9 1.6 0 1.1
  [4,15,.6,0,1.62,-.61,0,1.41,1.2,0,.9,1.6,0,1.1],
// 4 15 1.44 0 1.8 .6 0 1.62 1.6 0 1.1 2.09 0 1.23
  [4,15,1.44,0,1.8,.6,0,1.62,1.6,0,1.1,2.09,0,1.23],
// 3 15 1.7 0 1.89 1.44 0 1.8 2.09 0 1.23
  [3,15,1.7,0,1.89,1.44,0,1.8,2.09,0,1.23],
// 4 15 1.92 0 2.17 1.7 0 1.89 2.09 0 1.23 2.75 0 2.18
  [4,15,1.92,0,2.17,1.7,0,1.89,2.09,0,1.23,2.75,0,2.18],
// 4 15 1.92 0 2.17 2.75 0 2.18 2.72 0 2.32 2.44 0 2.91
  [4,15,1.92,0,2.17,2.75,0,2.18,2.72,0,2.32,2.44,0,2.91],
// 4 15 2.44 0 2.91 2.72 0 2.32 2.95 0 2.83 3.03 0 3.85
  [4,15,2.44,0,2.91,2.72,0,2.32,2.95,0,2.83,3.03,0,3.85],
// 4 15 3.03 0 3.85 2.95 0 2.83 3.45 0 3.57 3.47 0 4.33
  [4,15,3.03,0,3.85,2.95,0,2.83,3.45,0,3.57,3.47,0,4.33],
// 4 15 3.47 0 4.33 3.45 0 3.57 3.91 0 4.13 3.9 0 4.67
  [4,15,3.47,0,4.33,3.45,0,3.57,3.91,0,4.13,3.9,0,4.67],
// 3 15 3.9 0 4.67 3.91 0 4.13 4.25 0 4.38
  [3,15,3.9,0,4.67,3.91,0,4.13,4.25,0,4.38],
// 4 15 2.75 0 2.18 2.09 0 1.23 3.22 0 1.37 3.29 0 2.38
  [4,15,2.75,0,2.18,2.09,0,1.23,3.22,0,1.37,3.29,0,2.38],
// 4 15 3.29 0 2.38 3.22 0 1.37 4.25 0 1.77 4.02 0 2.82
  [4,15,3.29,0,2.38,3.22,0,1.37,4.25,0,1.77,4.02,0,2.82],
// 3 15 4.02 0 2.82 4.25 0 1.77 4.95 0 2.3
  [3,15,4.02,0,2.82,4.25,0,1.77,4.95,0,2.3],
// 4 15 1.1 0 .3 1.02 0 .6 0 0 0 .63 0 -.5
  [4,15,1.1,0,.3,1.02,0,.6,0,0,0,.63,0,-.5],
// 4 15 1.4 0 0 1.1 0 .3 .63 0 -.5 1.21 0 -1.3
  [4,15,1.4,0,0,1.1,0,.3,.63,0,-.5,1.21,0,-1.3],
// 4 15 2.22 0 -.85 1.4 0 0 1.21 0 -1.3 1.84 0 -2.44
  [4,15,2.22,0,-.85,1.4,0,0,1.21,0,-1.3,1.84,0,-2.44],
// 4 15 3.04 0 -2.08 2.22 0 -.85 1.84 0 -2.44 2.37 0 -3.64
  [4,15,3.04,0,-2.08,2.22,0,-.85,1.84,0,-2.44,2.37,0,-3.64],
// 4 15 3.72 0 -4.13 3.48 0 -3.105 2.37 0 -3.64 2.65 0 -4.51
  [4,15,3.72,0,-4.13,3.48,0,-3.105,2.37,0,-3.64,2.65,0,-4.51],
// 3 15 3.48 0 -3.105 3.04 0 -2.08 2.37 0 -3.64
  [3,15,3.48,0,-3.105,3.04,0,-2.08,2.37,0,-3.64],
// 4 15 3.72 0 -4.52 3.72 0 -4.13 2.65 0 -4.51 2.73 0 -4.93
  [4,15,3.72,0,-4.52,3.72,0,-4.13,2.65,0,-4.51,2.73,0,-4.93],
// 4 15 3.82 0 -4.75 3.72 0 -4.52 2.73 0 -4.93 2.71 0 -5.1
  [4,15,3.82,0,-4.75,3.72,0,-4.52,2.73,0,-4.93,2.71,0,-5.1],
// 4 15 -5.76 0 -1.12 -6.13 0 .1 -6.23 0 -1.03 -5.85 0 -1.9
  [4,15,-5.76,0,-1.12,-6.13,0,.1,-6.23,0,-1.03,-5.85,0,-1.9],
// 4 15 -5.17 0 -2.07 -5.76 0 -1.12 -5.85 0 -1.9 -5.62 0 -2.22
  [4,15,-5.17,0,-2.07,-5.76,0,-1.12,-5.85,0,-1.9,-5.62,0,-2.22],
// 4 15 -5.17 0 -2.07 -5.62 0 -2.22 -5.2 0 -2.72 -4.48 0 -2.69
  [4,15,-5.17,0,-2.07,-5.62,0,-2.22,-5.2,0,-2.72,-4.48,0,-2.69],
// 4 15 -4.48 0 -2.69 -5.2 0 -2.72 -4.51 0 -3.18 -3.88 0 -2.94
  [4,15,-4.48,0,-2.69,-5.2,0,-2.72,-4.51,0,-3.18,-3.88,0,-2.94],
// 4 15 -3.88 0 -2.94 -4.51 0 -3.18 -4.07 0 -3.35 -3.37 0 -2.92
  [4,15,-3.88,0,-2.94,-4.51,0,-3.18,-4.07,0,-3.35,-3.37,0,-2.92],
// 3 15 -3.37 0 -2.92 -4.07 0 -3.35 -3.7 0 -3.42
  [3,15,-3.37,0,-2.92,-4.07,0,-3.35,-3.7,0,-3.42],
// 4 15 -3.37 0 -2.92 -3.7 0 -3.42 -3.53 0 -3.8 -2.76 0 -3.04
  [4,15,-3.37,0,-2.92,-3.7,0,-3.42,-3.53,0,-3.8,-2.76,0,-3.04],
// 4 15 -3.01 0 -4.2 -2.76 0 -3.04 -3.53 0 -3.8 -3.7 0 -4.3
  [4,15,-3.01,0,-4.2,-2.76,0,-3.04,-3.53,0,-3.8,-3.7,0,-4.3],
// 3 15 -3.01 0 -4.2 -3.7 0 -4.3 -3.1 0 -5
  [3,15,-3.01,0,-4.2,-3.7,0,-4.3,-3.1,0,-5],
// 3 15 -3.7 0 -4.3 -3.05 0 -5.28 -3.1 0 -5
  [3,15,-3.7,0,-4.3,-3.05,0,-5.28,-3.1,0,-5],
// 4 15 -3.26 0 -2.31 -3.37 0 -2.92 -2.76 0 -3.04 -2.33 0 -1.87
  [4,15,-3.26,0,-2.31,-3.37,0,-2.92,-2.76,0,-3.04,-2.33,0,-1.87],
// 4 15 -3.03 0 -1.59 -3.26 0 -2.31 -2.33 0 -1.87 -1.88 0 -1.14
  [4,15,-3.03,0,-1.59,-3.26,0,-2.31,-2.33,0,-1.87,-1.88,0,-1.14],
// 4 15 -2.67 0 -.87 -3.03 0 -1.59 -1.88 0 -1.14 -2.42 0 -.52
  [4,15,-2.67,0,-.87,-3.03,0,-1.59,-1.88,0,-1.14,-2.42,0,-.52],
// 4 15 -2.42 0 -.52 -1.88 0 -1.14 -1.33 0 -.41 -2.39 0 -.29
  [4,15,-2.42,0,-.52,-1.88,0,-1.14,-1.33,0,-.41,-2.39,0,-.29],
// 3 15 3.82 0 -4.75 2.6789 0 -6.4673 4.07 0 -4.85
  [3,15,3.82,0,-4.75,2.6789,0,-6.4673,4.07,0,-4.85],
// 3 15 4.9497 0 -4.9497 4.07 0 -4.85 2.6789 0 -6.4673
  [3,15,4.9497,0,-4.9497,4.07,0,-4.85,2.6789,0,-6.4673],
// 3 15 4.07 0 -4.85 4.9497 0 -4.9497 4.4 0 -4.69
  [3,15,4.07,0,-4.85,4.9497,0,-4.9497,4.4,0,-4.69],
// 3 15 4.4 0 -4.69 4.9497 0 -4.9497 4.96 0 -4.22
  [3,15,4.4,0,-4.69,4.9497,0,-4.9497,4.96,0,-4.22],
// 3 15 -4.9497 0 4.9497 -4.11 0 4.85 -2.6789 0 6.4673
  [3,15,-4.9497,0,4.9497,-4.11,0,4.85,-2.6789,0,6.4673],
// 3 15 2.6789 0 6.4673 3.61 0 5.01 4.9497 0 4.9497
  [3,15,2.6789,0,6.4673,3.61,0,5.01,4.9497,0,4.9497],
// 3 15 4.9497 0 4.9497 3.61 0 5.01 3.9 0 4.67
  [3,15,4.9497,0,4.9497,3.61,0,5.01,3.9,0,4.67],
// 3 15 4.9497 0 4.9497 3.9 0 4.67 4.25 0 4.38
  [3,15,4.9497,0,4.9497,3.9,0,4.67,4.25,0,4.38],
// 3 15 4.9497 0 4.9497 4.25 0 4.38 4.42 0 4.25
  [3,15,4.9497,0,4.9497,4.25,0,4.38,4.42,0,4.25],
// 3 15 4.9497 0 4.9497 5.92 0 2.62 6.4673 0 2.6789
  [3,15,4.9497,0,4.9497,5.92,0,2.62,6.4673,0,2.6789],
// 3 15 6.4673 0 2.6789 5.92 0 2.62 6.25 0 1.81
  [3,15,6.4673,0,2.6789,5.92,0,2.62,6.25,0,1.81],
// 3 15 6.4673 0 2.6789 6.25 0 1.81 7 0 0
  [3,15,6.4673,0,2.6789,6.25,0,1.81,7,0,0],
// 3 15 4.96 0 -4.22 4.9497 0 -4.9497 6.4673 0 -2.6789
  [3,15,4.96,0,-4.22,4.9497,0,-4.9497,6.4673,0,-2.6789],
// 3 15 4.9497 0 4.9497 4.59 0 3.87 5.49 0 2.67
  [3,15,4.9497,0,4.9497,4.59,0,3.87,5.49,0,2.67],
// 3 15 5.49 0 2.67 4.59 0 3.87 4.5 0 3.61
  [3,15,5.49,0,2.67,4.59,0,3.87,4.5,0,3.61],
// 4 15 4.02 0 2.82 4.95 0 2.3 5.49 0 2.67 4.5 0 3.61
  [4,15,4.02,0,2.82,4.95,0,2.3,5.49,0,2.67,4.5,0,3.61],
];
module ldraw_lib__98138pn2(step=0, col=false, unit=2/5, alt=false, line=0.2, solid=!$preview)
    makepoly(ldraw_lib__98138pn2(), step=step, col=col, unit=unit, alt=alt, line=line, solid=solid);
ldraw_lib__98138pn2(line=0.2);
